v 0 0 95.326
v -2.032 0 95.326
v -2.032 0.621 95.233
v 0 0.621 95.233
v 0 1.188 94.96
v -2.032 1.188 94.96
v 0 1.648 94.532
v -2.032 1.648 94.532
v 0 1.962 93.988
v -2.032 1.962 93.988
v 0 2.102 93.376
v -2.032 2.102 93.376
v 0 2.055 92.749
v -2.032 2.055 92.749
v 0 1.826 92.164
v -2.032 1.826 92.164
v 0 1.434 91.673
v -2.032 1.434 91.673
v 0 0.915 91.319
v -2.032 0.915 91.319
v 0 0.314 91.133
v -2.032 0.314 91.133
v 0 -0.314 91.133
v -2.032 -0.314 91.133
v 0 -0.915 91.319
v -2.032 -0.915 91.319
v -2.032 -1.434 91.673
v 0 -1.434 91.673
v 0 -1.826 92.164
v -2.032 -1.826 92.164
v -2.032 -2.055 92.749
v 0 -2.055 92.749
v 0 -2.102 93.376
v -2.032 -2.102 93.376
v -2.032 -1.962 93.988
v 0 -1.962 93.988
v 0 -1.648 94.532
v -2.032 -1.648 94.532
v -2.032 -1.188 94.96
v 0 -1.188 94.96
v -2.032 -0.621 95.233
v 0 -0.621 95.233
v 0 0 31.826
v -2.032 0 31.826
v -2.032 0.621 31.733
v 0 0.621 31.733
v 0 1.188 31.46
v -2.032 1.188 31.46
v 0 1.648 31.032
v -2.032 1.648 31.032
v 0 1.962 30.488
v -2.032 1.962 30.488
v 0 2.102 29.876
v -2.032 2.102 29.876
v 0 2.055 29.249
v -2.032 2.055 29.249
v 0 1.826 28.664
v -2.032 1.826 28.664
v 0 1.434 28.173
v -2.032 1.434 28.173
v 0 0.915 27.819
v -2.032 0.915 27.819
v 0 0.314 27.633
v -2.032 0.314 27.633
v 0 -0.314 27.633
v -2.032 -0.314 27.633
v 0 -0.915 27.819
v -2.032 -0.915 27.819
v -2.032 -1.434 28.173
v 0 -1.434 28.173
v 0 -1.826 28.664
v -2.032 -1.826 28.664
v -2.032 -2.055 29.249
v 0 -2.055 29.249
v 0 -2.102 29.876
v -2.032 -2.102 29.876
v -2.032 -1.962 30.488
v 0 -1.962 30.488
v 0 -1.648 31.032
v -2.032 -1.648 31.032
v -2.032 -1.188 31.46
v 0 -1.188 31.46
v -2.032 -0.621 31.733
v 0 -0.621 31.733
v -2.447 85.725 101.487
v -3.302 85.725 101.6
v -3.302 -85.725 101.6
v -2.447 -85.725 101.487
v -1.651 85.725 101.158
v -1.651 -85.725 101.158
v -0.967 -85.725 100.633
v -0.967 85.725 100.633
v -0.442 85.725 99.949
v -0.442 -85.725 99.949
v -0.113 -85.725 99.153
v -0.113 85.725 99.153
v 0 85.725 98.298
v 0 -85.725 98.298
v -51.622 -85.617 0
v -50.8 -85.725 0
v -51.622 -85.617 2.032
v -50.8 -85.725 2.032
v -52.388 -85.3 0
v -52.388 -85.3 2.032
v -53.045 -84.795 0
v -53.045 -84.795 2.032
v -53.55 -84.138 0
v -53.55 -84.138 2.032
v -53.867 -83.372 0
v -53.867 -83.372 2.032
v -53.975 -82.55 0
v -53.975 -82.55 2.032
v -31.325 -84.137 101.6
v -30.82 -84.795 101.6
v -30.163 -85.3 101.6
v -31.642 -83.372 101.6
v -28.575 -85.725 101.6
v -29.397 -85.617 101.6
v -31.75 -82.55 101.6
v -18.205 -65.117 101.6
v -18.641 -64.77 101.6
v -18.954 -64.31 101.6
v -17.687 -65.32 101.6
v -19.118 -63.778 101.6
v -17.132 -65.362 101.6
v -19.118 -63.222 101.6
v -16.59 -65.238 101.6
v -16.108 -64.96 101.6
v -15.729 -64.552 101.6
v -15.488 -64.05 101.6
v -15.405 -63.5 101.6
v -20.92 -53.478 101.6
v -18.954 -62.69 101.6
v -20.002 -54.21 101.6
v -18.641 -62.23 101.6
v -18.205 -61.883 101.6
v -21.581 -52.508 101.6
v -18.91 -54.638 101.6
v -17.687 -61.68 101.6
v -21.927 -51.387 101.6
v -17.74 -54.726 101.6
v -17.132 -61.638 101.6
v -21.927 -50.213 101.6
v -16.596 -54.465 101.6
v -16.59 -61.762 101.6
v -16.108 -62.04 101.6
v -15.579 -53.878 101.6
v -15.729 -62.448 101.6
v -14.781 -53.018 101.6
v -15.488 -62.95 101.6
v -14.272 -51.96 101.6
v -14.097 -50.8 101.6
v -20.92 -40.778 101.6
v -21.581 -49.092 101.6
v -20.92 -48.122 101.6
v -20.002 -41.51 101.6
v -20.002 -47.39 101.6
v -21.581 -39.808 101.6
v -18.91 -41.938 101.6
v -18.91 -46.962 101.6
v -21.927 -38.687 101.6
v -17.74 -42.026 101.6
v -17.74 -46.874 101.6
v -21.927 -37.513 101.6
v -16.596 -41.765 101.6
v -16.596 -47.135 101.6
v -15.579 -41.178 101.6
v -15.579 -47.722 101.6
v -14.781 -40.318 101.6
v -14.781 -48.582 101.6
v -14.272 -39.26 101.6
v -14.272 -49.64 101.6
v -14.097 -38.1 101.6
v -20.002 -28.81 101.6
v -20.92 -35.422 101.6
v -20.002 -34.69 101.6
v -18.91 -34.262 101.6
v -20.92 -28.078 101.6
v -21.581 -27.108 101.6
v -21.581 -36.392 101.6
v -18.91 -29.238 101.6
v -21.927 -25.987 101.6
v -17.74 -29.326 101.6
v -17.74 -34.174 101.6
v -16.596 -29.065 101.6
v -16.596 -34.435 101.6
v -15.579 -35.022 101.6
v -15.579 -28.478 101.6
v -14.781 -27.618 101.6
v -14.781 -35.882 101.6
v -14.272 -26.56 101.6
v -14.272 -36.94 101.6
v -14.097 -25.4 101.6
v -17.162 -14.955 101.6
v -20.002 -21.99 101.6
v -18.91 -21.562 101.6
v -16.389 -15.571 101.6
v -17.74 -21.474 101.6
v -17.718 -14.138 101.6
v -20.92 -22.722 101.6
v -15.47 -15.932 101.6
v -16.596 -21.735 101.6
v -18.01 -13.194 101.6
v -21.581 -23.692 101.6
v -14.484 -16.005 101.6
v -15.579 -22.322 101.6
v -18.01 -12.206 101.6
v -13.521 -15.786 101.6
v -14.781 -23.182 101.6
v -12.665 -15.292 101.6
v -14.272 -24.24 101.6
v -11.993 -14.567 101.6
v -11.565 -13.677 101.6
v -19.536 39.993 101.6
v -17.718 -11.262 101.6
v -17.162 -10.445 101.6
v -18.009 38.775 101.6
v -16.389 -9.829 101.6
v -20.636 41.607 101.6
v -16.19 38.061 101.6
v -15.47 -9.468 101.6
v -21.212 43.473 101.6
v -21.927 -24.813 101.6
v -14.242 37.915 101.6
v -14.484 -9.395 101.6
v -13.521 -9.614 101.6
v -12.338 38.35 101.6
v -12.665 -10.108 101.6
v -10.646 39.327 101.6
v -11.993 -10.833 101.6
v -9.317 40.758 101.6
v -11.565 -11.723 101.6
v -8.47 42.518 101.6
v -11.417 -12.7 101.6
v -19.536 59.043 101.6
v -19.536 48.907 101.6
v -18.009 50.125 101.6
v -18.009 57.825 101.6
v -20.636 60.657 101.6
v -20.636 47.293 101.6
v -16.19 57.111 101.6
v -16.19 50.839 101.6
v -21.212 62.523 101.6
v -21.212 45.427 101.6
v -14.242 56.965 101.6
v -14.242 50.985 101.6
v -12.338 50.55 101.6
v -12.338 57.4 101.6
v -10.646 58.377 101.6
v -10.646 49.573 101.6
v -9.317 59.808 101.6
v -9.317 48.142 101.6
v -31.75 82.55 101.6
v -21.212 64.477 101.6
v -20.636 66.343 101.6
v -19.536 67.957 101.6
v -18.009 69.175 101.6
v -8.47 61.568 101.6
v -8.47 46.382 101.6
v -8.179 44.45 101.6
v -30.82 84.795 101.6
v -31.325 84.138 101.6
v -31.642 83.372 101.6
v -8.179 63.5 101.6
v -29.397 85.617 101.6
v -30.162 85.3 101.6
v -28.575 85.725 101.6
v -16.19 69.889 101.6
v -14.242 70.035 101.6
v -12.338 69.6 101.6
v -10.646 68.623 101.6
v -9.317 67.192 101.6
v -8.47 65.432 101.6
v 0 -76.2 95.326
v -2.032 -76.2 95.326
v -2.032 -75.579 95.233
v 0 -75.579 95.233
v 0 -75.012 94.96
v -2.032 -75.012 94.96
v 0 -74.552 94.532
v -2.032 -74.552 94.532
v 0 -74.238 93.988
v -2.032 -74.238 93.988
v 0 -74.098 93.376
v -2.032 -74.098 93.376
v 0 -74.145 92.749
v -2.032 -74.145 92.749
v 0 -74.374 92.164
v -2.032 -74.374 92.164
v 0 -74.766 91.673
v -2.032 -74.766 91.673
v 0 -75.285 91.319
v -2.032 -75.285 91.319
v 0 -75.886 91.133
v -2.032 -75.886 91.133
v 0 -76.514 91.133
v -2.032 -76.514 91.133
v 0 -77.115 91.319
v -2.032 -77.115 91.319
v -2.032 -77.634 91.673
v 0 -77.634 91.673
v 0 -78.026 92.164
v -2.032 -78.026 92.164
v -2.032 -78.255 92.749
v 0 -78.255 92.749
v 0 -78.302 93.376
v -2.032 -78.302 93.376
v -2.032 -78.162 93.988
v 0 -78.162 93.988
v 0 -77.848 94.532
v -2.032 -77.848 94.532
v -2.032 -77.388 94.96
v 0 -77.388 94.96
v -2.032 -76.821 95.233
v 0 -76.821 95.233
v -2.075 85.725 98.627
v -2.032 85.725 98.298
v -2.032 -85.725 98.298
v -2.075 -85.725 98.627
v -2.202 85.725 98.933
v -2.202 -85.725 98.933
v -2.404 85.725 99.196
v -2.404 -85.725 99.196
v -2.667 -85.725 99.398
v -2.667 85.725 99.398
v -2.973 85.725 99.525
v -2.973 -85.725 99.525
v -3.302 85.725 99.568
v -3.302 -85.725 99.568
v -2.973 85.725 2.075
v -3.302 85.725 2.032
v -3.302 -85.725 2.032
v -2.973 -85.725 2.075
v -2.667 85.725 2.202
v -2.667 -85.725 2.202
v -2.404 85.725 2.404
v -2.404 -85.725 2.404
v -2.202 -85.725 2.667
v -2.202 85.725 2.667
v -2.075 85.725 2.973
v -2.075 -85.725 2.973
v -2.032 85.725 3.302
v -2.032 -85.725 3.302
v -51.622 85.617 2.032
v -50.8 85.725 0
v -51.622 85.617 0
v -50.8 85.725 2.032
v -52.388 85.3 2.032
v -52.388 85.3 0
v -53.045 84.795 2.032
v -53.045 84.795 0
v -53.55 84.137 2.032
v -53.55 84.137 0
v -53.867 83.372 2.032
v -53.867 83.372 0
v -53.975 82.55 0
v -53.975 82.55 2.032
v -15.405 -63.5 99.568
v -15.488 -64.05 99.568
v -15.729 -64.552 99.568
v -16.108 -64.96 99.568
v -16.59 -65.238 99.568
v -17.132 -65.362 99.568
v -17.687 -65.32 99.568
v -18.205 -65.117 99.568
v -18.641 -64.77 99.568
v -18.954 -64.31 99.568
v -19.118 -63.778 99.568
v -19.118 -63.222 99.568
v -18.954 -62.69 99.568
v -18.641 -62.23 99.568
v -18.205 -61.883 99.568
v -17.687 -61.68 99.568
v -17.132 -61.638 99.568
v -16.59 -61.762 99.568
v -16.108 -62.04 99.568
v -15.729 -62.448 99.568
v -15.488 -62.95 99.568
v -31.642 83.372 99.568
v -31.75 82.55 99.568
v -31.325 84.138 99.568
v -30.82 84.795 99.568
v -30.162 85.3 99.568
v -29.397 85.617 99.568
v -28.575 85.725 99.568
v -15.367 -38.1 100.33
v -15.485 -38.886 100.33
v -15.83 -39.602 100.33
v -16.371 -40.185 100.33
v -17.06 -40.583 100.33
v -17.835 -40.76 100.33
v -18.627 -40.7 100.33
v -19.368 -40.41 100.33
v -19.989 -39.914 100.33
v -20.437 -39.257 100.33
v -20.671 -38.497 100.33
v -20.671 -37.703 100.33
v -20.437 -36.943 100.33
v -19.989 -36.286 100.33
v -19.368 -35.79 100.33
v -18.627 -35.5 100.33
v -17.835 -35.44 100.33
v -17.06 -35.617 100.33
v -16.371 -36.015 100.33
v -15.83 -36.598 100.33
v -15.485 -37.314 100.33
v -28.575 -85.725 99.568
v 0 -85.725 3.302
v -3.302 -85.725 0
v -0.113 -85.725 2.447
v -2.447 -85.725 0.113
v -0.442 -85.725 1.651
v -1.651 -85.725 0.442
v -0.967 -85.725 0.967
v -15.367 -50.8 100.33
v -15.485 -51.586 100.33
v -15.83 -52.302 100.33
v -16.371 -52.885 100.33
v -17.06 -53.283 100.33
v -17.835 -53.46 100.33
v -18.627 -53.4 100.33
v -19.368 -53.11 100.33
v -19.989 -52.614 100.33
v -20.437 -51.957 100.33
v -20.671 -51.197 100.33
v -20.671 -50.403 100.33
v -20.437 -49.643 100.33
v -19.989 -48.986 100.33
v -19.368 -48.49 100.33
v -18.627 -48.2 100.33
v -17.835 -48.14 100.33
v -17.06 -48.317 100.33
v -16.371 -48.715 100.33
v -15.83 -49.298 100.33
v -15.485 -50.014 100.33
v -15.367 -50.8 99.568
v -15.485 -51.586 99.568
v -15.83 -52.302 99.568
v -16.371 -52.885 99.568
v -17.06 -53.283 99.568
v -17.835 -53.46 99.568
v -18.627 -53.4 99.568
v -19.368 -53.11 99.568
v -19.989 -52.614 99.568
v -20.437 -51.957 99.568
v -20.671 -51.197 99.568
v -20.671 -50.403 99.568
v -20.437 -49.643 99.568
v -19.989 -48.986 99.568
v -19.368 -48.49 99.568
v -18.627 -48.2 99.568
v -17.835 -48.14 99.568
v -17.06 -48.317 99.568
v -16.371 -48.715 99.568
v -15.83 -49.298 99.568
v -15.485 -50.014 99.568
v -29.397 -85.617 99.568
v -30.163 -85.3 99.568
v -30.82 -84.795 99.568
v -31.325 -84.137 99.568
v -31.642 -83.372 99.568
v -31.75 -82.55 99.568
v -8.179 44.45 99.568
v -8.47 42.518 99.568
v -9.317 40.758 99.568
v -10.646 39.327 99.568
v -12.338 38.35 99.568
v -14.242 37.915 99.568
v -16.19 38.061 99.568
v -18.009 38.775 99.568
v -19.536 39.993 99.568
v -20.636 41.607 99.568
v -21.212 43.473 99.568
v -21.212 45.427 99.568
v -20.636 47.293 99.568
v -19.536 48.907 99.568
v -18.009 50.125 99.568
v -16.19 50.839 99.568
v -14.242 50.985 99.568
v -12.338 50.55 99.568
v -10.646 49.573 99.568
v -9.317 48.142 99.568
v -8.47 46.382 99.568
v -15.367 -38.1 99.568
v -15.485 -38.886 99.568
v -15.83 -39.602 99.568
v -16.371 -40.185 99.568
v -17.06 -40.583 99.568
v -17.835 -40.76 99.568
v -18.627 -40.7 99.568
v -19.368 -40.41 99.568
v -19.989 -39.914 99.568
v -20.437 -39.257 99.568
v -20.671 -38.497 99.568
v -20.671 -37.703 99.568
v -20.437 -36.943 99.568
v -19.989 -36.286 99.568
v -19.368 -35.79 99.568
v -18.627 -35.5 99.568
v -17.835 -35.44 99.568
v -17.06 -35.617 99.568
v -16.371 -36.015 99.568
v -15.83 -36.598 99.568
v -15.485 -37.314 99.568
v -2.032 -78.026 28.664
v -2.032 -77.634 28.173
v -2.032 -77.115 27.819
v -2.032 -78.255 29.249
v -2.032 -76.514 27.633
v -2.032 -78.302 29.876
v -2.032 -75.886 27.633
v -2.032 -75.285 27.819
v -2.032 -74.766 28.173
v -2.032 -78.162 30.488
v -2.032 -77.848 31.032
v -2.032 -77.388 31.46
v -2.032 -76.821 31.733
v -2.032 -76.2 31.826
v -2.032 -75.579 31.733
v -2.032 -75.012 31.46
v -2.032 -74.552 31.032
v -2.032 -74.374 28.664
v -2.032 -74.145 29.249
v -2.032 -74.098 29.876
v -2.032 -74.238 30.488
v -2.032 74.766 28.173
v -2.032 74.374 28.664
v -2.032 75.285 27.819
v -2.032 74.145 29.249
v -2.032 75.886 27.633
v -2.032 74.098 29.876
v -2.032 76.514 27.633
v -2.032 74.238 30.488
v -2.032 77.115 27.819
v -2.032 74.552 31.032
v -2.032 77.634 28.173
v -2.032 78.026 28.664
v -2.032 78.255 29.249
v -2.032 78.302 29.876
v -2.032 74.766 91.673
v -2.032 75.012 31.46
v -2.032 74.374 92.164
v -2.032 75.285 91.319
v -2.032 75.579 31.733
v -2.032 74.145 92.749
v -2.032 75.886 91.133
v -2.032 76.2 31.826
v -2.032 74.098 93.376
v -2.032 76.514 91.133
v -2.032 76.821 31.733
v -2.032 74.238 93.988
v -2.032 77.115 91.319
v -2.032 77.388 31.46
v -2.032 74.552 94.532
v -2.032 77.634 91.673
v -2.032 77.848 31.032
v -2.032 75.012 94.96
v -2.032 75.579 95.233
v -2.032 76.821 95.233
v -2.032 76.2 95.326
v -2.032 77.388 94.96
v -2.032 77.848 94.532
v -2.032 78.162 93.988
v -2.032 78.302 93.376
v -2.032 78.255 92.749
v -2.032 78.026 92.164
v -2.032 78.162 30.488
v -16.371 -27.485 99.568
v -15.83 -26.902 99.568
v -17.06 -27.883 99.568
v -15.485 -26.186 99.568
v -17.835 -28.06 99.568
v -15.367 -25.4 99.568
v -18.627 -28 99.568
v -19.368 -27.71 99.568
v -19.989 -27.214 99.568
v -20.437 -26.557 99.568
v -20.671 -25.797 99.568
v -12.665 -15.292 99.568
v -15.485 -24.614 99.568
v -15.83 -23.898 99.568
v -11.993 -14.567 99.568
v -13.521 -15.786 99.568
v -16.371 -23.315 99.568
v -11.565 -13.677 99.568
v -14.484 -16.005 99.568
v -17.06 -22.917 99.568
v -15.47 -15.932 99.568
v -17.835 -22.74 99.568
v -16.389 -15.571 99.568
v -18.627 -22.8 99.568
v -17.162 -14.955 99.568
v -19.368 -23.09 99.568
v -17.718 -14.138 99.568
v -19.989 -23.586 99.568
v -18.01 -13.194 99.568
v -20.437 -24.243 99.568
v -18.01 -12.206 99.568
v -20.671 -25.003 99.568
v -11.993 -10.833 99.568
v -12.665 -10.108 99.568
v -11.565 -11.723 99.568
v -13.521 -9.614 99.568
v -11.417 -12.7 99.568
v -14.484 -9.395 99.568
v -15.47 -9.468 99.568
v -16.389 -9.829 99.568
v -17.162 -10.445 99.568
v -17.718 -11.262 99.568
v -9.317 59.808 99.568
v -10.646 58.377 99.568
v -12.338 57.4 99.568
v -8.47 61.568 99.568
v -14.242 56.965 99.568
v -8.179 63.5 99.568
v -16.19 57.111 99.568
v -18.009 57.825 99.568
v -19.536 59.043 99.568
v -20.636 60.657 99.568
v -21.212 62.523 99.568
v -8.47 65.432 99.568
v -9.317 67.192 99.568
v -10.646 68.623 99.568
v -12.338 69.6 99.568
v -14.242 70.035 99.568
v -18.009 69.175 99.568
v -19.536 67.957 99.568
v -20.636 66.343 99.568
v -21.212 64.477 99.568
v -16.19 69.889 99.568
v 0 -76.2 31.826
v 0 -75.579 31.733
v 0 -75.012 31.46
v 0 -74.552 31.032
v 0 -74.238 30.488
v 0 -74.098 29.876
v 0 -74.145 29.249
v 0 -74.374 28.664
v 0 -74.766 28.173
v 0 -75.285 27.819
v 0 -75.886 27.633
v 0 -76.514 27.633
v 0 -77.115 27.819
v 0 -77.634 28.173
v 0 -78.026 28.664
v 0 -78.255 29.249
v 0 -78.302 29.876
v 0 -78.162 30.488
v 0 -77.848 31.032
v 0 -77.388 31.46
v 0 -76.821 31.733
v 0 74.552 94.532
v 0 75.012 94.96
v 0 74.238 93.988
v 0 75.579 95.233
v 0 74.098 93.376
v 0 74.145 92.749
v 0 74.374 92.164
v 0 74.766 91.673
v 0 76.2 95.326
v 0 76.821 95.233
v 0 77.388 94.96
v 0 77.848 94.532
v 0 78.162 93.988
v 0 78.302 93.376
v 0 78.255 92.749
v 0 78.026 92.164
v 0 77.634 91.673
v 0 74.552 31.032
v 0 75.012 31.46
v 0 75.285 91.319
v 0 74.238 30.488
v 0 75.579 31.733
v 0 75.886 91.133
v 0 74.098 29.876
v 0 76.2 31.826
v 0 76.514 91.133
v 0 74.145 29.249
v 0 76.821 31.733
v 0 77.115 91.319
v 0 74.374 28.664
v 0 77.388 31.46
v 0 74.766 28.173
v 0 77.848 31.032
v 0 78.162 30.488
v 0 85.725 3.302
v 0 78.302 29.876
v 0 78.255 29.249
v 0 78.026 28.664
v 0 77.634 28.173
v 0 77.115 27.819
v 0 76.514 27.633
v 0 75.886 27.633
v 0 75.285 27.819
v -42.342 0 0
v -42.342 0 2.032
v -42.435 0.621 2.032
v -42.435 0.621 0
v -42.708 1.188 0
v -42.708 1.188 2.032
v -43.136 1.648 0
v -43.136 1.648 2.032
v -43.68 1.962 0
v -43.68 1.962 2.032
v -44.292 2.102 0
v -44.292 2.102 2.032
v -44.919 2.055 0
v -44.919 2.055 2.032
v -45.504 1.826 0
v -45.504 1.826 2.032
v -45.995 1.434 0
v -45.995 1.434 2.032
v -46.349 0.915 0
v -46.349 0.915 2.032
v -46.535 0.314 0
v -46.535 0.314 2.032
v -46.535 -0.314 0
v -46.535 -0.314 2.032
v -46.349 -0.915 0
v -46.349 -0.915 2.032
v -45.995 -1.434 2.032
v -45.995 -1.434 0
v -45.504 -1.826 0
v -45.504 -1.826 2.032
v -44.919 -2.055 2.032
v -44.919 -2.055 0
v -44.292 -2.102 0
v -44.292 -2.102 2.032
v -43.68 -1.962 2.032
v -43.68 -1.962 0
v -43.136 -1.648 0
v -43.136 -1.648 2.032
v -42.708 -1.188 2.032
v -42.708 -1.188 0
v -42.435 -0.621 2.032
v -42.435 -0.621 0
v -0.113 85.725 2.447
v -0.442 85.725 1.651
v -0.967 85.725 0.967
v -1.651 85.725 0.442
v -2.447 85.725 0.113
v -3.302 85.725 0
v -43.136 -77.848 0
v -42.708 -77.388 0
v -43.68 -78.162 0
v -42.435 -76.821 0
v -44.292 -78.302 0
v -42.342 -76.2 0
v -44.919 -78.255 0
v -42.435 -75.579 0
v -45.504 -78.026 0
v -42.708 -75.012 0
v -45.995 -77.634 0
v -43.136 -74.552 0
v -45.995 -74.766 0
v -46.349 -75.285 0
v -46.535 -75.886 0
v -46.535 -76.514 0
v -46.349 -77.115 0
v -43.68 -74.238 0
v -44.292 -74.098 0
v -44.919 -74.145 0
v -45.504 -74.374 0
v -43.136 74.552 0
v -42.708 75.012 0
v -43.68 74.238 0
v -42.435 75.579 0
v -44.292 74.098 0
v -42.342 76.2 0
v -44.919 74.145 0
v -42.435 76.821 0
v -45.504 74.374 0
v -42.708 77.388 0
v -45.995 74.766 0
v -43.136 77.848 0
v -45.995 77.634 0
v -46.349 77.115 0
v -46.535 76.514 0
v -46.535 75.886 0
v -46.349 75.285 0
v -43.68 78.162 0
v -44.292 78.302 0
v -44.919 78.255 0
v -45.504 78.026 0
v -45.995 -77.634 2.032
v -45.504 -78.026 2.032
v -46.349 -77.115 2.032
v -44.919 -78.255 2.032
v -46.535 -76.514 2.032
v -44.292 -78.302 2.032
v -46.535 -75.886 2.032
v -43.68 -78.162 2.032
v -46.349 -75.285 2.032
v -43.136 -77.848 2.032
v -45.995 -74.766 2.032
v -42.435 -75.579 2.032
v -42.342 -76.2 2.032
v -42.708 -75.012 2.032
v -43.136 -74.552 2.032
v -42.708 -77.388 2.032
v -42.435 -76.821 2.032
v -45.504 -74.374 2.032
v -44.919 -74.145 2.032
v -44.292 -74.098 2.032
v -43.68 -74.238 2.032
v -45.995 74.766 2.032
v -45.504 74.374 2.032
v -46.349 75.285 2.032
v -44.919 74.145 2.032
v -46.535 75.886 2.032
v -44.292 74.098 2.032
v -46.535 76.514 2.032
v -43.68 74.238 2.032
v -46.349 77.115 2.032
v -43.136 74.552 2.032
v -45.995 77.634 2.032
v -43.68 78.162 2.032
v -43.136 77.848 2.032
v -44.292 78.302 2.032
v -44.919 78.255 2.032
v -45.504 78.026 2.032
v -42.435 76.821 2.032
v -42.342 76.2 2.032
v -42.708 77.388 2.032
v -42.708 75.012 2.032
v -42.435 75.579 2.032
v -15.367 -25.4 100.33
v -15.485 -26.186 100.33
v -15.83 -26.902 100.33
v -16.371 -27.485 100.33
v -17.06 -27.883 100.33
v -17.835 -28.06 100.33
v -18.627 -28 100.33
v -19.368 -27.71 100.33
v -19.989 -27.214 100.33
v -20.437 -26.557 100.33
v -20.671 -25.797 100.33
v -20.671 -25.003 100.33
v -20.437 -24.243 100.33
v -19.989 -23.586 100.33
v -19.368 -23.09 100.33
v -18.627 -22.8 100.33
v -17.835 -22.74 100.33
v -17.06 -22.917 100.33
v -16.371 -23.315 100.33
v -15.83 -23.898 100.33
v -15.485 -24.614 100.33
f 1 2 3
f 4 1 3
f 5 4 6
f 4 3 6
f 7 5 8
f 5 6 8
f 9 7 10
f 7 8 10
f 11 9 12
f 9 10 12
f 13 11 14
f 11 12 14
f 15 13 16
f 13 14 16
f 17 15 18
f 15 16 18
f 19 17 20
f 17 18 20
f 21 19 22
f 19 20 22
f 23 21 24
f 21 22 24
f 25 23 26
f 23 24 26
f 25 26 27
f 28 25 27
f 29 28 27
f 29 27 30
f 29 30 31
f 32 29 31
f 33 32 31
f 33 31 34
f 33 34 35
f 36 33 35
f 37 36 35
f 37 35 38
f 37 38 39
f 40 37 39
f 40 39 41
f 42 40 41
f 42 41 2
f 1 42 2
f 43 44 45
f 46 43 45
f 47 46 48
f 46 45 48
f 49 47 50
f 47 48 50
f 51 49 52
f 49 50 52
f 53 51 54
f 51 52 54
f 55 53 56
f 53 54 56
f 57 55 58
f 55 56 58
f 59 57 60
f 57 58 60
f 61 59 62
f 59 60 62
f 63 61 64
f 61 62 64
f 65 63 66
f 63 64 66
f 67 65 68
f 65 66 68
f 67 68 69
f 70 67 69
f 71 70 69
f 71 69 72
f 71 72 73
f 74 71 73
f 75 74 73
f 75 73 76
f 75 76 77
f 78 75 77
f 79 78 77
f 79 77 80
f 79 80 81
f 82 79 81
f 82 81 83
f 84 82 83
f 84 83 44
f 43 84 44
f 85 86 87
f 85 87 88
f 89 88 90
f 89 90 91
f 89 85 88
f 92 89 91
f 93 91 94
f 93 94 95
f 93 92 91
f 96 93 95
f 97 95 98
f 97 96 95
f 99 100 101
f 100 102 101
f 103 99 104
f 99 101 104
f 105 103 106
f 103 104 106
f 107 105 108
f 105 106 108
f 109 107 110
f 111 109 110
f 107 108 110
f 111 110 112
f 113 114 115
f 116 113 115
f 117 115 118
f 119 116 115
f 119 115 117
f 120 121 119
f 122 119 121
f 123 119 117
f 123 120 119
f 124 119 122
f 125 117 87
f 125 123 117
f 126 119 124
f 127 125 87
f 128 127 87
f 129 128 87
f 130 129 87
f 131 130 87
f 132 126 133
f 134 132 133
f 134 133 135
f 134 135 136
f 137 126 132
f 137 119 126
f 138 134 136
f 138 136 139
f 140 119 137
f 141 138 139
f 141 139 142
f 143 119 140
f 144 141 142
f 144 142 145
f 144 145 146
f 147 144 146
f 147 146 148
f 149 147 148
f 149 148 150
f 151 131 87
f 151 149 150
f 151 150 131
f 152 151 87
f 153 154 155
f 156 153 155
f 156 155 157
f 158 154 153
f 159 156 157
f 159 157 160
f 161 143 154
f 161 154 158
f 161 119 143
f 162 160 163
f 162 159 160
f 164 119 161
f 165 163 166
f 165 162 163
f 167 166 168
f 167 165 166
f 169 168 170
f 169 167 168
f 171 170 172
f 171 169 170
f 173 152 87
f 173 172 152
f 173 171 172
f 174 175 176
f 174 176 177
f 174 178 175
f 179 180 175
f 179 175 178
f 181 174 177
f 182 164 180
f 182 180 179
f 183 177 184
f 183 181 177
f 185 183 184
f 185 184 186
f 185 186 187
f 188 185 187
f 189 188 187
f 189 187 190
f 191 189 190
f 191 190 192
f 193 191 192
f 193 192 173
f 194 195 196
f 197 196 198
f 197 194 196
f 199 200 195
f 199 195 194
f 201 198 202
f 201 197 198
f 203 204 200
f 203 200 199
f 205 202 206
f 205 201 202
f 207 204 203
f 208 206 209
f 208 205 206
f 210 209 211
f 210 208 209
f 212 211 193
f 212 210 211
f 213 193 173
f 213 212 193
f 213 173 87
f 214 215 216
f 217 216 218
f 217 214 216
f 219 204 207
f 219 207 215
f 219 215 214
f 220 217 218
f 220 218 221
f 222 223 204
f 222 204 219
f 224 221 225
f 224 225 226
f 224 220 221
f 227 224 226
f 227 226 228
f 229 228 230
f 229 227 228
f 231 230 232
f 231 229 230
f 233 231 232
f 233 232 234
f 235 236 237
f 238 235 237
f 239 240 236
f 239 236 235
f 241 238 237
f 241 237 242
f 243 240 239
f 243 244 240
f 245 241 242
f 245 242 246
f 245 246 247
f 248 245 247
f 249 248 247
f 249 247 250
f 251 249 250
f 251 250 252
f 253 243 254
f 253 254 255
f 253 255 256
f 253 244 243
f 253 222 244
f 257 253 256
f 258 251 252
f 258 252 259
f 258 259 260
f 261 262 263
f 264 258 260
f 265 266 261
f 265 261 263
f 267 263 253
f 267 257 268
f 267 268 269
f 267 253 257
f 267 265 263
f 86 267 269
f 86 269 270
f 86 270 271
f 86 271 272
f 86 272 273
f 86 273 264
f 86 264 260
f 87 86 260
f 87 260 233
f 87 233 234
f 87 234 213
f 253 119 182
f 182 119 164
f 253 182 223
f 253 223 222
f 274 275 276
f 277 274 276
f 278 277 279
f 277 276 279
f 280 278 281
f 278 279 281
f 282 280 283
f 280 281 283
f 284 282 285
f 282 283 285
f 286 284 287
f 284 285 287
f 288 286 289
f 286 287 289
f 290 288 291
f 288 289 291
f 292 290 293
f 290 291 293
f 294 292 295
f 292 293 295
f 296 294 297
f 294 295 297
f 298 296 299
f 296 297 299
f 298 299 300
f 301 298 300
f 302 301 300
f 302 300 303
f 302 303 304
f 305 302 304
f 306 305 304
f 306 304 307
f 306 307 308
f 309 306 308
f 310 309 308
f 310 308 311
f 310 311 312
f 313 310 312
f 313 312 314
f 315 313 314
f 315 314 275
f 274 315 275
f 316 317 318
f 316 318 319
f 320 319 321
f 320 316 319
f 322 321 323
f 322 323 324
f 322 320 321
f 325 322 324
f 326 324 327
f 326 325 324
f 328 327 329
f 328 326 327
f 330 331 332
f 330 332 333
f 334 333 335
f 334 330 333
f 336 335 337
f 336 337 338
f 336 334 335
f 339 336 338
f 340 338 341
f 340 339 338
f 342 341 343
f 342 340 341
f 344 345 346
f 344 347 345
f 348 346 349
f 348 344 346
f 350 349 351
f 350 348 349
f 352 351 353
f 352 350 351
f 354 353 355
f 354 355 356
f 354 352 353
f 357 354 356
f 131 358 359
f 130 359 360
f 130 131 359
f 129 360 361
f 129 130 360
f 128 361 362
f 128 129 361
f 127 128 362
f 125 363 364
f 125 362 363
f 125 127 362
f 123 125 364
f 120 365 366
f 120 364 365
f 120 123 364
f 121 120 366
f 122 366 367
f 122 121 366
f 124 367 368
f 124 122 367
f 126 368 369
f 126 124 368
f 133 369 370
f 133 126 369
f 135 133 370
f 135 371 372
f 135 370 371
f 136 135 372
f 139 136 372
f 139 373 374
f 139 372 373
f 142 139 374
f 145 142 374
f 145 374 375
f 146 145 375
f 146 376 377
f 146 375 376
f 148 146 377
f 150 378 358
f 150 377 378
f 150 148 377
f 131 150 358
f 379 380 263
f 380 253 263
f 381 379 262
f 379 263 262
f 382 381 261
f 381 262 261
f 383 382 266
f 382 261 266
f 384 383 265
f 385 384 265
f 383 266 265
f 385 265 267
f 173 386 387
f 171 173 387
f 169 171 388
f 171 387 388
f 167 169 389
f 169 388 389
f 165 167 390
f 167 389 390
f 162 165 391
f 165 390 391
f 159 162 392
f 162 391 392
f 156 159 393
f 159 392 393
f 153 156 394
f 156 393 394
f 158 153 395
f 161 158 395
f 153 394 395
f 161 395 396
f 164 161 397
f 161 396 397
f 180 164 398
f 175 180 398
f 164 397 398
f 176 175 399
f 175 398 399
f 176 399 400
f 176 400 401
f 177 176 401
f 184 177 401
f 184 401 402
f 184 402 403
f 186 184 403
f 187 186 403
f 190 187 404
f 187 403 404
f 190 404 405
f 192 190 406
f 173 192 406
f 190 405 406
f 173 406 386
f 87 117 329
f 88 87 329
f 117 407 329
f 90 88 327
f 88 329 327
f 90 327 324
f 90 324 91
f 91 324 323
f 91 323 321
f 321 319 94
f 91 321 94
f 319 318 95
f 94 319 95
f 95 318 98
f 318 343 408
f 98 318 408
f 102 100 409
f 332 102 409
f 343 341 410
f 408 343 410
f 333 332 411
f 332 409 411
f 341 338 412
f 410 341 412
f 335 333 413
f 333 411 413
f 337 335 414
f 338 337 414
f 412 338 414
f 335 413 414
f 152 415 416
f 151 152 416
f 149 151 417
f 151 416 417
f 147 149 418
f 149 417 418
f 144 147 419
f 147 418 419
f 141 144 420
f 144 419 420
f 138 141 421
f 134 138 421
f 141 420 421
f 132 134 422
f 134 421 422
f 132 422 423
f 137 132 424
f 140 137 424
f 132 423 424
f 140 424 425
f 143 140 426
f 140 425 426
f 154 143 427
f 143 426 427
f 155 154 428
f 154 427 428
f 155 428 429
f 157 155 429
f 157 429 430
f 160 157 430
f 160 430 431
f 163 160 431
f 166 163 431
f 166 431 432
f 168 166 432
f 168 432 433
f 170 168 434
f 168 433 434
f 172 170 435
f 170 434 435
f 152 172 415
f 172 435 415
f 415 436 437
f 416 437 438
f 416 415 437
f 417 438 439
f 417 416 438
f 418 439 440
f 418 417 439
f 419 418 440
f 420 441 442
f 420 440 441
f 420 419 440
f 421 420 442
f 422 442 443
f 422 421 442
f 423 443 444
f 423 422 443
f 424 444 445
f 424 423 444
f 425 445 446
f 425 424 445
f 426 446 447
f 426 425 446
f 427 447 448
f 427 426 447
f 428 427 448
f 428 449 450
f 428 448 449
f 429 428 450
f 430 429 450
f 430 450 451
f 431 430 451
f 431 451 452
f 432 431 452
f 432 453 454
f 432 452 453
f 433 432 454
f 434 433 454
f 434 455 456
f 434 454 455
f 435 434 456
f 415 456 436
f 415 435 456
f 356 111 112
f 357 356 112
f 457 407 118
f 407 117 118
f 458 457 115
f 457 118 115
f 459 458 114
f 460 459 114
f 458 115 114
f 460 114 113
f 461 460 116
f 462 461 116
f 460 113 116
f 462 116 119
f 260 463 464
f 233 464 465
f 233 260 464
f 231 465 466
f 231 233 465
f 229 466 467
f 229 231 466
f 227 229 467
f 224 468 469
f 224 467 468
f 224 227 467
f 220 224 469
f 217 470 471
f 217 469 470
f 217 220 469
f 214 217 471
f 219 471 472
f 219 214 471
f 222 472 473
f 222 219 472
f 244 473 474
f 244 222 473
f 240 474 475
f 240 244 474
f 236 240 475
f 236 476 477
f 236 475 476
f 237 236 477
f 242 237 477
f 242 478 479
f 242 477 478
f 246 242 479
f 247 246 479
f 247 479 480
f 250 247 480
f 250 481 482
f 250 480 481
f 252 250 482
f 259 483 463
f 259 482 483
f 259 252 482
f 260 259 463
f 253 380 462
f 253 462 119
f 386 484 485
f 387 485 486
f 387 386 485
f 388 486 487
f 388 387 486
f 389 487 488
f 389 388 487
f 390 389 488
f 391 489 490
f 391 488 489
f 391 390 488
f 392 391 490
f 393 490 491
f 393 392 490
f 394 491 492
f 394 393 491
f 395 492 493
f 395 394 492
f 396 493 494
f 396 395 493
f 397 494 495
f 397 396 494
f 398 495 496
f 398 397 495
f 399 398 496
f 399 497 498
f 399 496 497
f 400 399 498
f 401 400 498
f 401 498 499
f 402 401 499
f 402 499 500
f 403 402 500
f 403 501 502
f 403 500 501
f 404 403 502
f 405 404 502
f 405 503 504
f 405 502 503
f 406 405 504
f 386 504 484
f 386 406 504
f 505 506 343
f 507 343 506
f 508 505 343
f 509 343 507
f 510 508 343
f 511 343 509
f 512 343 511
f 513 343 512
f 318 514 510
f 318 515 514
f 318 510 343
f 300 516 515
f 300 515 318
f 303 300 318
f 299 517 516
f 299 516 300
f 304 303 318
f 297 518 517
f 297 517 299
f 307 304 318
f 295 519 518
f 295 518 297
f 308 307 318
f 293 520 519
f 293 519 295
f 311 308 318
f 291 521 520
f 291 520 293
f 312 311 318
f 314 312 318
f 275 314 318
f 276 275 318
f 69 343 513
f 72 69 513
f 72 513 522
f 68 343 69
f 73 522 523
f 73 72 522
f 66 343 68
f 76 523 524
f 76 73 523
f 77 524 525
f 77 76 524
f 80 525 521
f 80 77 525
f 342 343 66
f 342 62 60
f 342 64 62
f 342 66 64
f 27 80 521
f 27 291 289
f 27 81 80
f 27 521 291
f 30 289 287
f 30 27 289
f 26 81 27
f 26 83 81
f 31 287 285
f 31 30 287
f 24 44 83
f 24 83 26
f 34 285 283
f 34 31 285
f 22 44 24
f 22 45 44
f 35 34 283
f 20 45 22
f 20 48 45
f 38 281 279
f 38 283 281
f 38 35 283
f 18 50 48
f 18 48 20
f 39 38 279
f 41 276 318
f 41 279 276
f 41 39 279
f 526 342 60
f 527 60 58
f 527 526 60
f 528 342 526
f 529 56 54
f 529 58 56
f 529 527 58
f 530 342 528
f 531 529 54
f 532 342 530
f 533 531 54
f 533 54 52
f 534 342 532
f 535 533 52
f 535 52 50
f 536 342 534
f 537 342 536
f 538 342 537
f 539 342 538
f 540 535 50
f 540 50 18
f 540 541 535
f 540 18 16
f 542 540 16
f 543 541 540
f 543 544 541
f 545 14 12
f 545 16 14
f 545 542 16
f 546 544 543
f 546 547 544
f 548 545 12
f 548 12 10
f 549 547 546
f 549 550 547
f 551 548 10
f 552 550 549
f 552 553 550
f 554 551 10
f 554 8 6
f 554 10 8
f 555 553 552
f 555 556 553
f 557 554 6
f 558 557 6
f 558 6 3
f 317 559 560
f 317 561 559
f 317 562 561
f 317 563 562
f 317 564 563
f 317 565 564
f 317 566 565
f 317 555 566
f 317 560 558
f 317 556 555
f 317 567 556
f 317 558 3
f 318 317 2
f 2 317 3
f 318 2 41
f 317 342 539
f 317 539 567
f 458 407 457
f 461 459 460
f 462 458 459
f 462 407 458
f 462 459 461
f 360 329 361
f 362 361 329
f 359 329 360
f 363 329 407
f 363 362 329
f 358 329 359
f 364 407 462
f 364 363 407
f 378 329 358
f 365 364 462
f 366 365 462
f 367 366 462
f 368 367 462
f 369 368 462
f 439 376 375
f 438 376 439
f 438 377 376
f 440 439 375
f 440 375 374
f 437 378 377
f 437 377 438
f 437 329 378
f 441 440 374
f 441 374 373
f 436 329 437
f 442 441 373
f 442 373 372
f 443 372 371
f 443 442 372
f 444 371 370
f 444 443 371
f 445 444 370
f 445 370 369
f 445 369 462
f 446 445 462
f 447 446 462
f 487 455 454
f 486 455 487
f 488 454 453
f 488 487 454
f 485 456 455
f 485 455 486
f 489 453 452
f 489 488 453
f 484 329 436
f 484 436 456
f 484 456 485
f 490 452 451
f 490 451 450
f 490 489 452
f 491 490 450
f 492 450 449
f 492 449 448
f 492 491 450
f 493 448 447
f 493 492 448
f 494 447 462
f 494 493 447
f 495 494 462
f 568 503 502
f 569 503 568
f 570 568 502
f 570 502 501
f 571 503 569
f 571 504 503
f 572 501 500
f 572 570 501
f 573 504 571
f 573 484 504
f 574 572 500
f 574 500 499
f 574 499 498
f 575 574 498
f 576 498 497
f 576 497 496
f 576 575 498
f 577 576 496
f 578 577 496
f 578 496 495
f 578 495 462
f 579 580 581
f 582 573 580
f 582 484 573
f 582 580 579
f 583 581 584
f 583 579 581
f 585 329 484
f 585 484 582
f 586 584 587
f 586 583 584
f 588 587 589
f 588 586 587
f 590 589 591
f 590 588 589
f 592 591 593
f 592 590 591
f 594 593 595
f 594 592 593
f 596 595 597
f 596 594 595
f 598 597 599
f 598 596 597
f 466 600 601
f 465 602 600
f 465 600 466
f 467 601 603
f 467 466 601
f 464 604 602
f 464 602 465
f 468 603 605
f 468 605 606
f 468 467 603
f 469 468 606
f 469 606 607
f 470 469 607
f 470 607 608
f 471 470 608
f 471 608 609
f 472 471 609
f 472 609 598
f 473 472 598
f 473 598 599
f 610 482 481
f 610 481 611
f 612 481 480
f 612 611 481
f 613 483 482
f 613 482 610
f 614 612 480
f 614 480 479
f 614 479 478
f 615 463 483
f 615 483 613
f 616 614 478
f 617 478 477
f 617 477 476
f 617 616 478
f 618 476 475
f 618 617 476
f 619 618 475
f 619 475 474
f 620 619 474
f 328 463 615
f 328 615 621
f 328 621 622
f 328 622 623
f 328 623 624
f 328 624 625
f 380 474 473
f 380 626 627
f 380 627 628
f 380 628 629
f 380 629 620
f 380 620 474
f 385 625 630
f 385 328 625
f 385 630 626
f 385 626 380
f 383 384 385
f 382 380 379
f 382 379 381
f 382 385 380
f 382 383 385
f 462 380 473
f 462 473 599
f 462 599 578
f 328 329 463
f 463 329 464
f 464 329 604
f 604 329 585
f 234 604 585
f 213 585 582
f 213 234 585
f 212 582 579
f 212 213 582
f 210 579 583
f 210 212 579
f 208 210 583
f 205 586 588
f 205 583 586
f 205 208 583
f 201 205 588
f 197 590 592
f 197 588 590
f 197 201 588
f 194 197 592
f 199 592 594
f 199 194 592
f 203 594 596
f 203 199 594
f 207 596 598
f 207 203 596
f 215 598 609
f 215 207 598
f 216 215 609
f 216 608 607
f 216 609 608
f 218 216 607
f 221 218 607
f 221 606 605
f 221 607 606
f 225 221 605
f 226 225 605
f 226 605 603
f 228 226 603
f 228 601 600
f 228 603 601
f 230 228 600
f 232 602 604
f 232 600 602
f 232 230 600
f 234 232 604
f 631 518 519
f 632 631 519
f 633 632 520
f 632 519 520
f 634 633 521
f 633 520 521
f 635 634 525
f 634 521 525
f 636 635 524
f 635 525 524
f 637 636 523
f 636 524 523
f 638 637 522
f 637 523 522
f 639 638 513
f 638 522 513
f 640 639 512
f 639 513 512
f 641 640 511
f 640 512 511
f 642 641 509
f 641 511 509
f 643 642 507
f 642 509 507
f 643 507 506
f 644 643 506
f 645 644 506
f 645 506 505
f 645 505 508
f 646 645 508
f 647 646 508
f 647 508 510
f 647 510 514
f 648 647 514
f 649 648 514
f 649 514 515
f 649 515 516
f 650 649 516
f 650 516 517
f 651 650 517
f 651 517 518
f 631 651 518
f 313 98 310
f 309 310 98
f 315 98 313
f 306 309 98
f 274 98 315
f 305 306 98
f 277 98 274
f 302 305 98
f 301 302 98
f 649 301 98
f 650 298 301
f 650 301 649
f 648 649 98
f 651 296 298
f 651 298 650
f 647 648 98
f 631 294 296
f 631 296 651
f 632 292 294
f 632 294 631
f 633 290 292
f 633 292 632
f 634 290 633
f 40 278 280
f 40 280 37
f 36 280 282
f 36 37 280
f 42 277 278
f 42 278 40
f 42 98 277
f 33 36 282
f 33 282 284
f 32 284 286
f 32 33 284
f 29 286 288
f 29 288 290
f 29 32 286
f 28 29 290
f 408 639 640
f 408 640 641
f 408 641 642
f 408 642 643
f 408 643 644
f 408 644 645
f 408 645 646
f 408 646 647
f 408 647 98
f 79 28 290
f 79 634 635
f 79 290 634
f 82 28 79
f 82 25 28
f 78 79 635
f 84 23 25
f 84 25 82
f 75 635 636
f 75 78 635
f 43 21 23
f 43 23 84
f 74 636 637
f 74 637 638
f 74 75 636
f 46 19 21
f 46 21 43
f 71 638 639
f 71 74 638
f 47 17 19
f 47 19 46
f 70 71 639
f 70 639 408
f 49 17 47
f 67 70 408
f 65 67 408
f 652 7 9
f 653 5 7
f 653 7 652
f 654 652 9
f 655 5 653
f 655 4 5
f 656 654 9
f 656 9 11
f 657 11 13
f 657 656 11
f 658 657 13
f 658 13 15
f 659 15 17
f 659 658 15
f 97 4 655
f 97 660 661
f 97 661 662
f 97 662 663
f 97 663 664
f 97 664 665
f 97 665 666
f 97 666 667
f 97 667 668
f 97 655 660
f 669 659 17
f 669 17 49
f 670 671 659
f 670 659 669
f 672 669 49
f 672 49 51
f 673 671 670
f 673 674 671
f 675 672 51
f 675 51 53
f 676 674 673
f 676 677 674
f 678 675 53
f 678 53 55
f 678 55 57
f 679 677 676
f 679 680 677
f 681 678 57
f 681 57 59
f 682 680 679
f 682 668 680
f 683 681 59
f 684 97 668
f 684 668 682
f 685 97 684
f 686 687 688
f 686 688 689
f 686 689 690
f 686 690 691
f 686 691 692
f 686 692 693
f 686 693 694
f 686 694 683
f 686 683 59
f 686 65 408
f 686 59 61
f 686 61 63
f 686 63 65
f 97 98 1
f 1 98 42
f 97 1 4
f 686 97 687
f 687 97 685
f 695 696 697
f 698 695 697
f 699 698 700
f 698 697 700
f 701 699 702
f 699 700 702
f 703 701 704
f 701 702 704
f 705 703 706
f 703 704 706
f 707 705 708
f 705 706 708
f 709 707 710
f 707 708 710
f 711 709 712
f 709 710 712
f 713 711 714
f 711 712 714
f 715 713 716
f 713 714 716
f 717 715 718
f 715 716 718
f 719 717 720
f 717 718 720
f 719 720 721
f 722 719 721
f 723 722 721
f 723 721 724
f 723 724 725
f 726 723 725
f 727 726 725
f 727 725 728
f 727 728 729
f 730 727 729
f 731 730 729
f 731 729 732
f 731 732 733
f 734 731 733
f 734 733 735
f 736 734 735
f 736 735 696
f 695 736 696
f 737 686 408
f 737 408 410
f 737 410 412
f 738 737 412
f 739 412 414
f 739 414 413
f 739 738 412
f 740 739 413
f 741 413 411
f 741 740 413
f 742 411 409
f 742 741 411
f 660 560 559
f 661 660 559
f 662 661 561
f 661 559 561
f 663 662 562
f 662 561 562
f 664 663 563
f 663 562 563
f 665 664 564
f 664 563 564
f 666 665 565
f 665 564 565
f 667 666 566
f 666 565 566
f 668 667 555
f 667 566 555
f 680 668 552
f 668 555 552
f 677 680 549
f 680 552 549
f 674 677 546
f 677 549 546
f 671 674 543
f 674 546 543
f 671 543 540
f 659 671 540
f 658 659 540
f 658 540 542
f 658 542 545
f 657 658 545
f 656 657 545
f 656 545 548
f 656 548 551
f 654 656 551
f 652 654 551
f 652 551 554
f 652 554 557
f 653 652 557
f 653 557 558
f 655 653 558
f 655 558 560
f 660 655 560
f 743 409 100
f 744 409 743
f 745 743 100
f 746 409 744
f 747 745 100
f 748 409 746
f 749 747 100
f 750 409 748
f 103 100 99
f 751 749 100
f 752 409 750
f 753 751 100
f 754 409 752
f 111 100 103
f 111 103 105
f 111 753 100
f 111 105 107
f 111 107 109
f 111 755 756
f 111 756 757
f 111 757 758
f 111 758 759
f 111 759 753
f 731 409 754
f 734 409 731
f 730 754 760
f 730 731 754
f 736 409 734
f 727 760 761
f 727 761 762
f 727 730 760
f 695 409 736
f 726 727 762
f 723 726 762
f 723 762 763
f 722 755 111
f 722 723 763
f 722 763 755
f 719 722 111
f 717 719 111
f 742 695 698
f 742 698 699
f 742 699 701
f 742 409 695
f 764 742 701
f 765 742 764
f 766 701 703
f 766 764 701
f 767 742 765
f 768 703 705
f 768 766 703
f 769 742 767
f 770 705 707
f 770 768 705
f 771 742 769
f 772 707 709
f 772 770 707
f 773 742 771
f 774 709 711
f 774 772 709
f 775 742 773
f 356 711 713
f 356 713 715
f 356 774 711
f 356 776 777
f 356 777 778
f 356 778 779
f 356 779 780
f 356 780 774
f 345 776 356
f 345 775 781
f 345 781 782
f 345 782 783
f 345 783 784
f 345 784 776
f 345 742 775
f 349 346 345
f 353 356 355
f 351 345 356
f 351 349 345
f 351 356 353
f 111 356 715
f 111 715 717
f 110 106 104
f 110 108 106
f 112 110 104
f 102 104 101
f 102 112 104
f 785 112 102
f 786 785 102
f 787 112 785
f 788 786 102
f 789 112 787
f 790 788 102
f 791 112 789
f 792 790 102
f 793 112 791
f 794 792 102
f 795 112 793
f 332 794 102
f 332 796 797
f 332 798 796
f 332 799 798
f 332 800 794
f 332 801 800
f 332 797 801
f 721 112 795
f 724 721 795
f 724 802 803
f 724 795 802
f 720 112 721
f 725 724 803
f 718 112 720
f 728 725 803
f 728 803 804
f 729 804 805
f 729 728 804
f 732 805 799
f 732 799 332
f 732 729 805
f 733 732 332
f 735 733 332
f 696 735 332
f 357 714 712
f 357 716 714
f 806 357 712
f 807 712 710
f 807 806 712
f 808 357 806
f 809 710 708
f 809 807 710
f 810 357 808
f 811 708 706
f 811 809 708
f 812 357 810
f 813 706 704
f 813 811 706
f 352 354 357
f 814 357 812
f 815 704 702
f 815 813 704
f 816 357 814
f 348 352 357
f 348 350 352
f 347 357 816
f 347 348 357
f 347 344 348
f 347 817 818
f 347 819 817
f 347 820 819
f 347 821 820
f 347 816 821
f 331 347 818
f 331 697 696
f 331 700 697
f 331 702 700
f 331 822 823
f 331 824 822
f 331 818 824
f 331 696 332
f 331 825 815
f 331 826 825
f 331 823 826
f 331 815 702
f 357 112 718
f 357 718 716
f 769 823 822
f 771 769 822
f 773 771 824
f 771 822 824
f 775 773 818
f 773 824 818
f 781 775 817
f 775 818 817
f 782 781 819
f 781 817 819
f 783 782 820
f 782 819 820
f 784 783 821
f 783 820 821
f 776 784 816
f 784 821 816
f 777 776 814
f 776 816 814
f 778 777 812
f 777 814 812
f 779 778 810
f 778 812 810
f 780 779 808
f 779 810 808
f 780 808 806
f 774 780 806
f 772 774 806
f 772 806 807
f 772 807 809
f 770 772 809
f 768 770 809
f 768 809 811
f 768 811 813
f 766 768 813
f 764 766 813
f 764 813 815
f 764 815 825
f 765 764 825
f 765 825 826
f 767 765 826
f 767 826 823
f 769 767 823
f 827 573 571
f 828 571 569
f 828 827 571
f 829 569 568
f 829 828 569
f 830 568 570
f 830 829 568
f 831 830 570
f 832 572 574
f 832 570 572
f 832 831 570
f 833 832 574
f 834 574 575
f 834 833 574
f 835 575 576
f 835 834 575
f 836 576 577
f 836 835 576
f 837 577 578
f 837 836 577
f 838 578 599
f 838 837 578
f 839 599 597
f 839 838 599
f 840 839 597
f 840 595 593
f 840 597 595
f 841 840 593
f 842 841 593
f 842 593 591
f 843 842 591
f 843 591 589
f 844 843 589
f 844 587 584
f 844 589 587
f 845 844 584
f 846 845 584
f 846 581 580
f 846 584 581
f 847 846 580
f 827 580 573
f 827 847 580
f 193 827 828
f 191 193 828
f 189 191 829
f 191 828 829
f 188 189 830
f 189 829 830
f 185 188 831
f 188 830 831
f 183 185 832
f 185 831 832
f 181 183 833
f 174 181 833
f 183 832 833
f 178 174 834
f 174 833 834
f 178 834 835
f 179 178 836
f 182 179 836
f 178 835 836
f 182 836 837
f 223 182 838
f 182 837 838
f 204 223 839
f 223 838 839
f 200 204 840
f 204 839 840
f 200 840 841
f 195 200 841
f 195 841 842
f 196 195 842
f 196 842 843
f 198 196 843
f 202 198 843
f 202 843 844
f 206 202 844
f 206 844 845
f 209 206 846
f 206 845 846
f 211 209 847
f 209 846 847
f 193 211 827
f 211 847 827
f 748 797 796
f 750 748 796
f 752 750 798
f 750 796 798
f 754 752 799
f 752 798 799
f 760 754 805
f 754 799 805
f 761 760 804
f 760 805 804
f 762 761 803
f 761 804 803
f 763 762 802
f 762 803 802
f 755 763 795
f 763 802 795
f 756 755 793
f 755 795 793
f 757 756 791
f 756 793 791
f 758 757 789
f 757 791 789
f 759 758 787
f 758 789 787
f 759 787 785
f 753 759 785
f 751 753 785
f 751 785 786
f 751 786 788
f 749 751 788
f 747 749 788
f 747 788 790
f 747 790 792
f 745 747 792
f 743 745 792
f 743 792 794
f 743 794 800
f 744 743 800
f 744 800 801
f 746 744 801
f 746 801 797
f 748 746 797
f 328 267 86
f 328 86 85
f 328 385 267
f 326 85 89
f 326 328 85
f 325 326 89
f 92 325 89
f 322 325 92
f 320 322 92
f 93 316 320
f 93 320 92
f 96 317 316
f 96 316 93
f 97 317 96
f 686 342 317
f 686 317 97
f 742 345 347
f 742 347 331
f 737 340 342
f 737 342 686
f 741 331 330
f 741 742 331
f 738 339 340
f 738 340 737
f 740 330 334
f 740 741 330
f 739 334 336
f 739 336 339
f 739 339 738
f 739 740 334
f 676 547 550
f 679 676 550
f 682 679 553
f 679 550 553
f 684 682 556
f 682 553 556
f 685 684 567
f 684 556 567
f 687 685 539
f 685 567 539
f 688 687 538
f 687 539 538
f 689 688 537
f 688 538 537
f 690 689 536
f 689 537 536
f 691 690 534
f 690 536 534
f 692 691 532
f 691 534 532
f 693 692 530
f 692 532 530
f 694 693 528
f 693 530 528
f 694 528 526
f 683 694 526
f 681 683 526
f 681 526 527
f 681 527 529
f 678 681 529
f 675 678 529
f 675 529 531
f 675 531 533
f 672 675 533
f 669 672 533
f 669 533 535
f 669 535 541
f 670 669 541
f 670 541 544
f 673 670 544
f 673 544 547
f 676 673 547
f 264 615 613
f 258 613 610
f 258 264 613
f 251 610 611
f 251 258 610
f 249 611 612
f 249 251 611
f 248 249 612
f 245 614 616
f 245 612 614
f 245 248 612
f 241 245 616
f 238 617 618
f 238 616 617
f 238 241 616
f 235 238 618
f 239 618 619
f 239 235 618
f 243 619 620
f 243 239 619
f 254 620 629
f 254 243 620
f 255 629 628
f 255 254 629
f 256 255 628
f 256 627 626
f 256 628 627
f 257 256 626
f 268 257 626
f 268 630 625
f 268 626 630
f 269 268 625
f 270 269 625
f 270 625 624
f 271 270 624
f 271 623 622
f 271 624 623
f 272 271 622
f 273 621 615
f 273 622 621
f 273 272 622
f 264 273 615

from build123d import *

# Parameters (mm, degrees)
BASE_FLANGE1_DEPTH                 = 85.725
SKETCH2_R                          = 6.5532
SKETCH2_R_2                        = 3.3147
SKETCH2_R_3                        = 2.667
SKETCH2_R_4                        = 1.8669
FCE_1_INDICATOR_HOLES_DEPTH        = 2.54
SKETCH3_R                          = 2.1082
FCE_2_BRACKET_MOUNTING_HOLES_DEPTH = 2.54
CHAMFER1_SIZE                      = 1.27
SKETCH8_R                          = 2.1082
FCE_3_BOARD_MOUNTING_HOLES_DEPTH   = 2.54
FILLET1_R                          = 3.175


# Sheet-metal steps are written as plain solids
with BuildPart() as part:
    # Sketch1 → Base-Flange1 (new, symmetric)
    with BuildSketch(Plane(origin=(0, 0, 0), x_dir=(1, 0, 0), z_dir=(0, 1, 0))):
        with BuildLine():
            Line((-31.75, -101.6), (-3.302, -101.6))
            ThreePointArc((-3.302, -101.6), (-0.967133409, -100.632866591), (0, -98.298))
            Line((0, -98.298), (0, -3.302))
            ThreePointArc((0, -3.302), (-0.967133409, -0.967133409), (-3.302, 0))
            Line((-3.302, 0), (-53.975, 0))
            Line((-53.975, 0), (-53.975, -2.032))
            Line((-53.975, -2.032), (-3.302, -2.032))
            ThreePointArc((-3.302, -2.032), (-2.403974388, -2.403974388), (-2.032, -3.302))
            Line((-2.032, -3.302), (-2.032, -98.298))
            ThreePointArc((-2.032, -98.298), (-2.403974388, -99.196025612), (-3.302, -99.568))
            Line((-3.302, -99.568), (-31.75, -99.568))
            Line((-31.75, -99.568), (-31.75, -101.6))
        make_face()
    extrude(amount=BASE_FLANGE1_DEPTH, both=True)

    # Sketch2 → FCE-1 Indicator holes (cut)
    with BuildSketch(Plane(origin=(0, 0, 101.6), x_dir=(-1, 0, 0), z_dir=(0, 0, -1))):
        with Locations(Location((14.732, 63.5, 0), (0, 0, 180))):
            Circle(SKETCH2_R)
        with Locations(Location((14.732, 44.45, 0), (0, 0, 180))):
            Circle(SKETCH2_R)
        with Locations(Location((14.732, -12.7, 0), (0, 0, 180))):
            Circle(SKETCH2_R_2)
        with Locations(Location((18.034, -25.4, 0), (0, 0, 180))):
            Circle(SKETCH2_R_3)
        with Locations(Location((18.034, -38.1, 0), (0, 0, 180))):
            Circle(SKETCH2_R_3)
        with Locations(Location((18.034, -50.8, 0), (0, 0, 180))):
            Circle(SKETCH2_R_3)
        with Locations(Location((17.272, -63.5, 0), (0, 0, 180))):
            Circle(SKETCH2_R_4)
    extrude(amount=FCE_1_INDICATOR_HOLES_DEPTH, mode=Mode.SUBTRACT)

    # Sketch3 → FCE-2 Bracket Mounting Holes (cut)
    with BuildSketch(Plane.XY.offset(2.032)):
        with Locations((-44.45, 76.2)):
            Circle(SKETCH3_R)
        with Locations((-44.45, 0)):
            Circle(SKETCH3_R)
        with Locations((-44.45, -76.2)):
            Circle(SKETCH3_R)
    extrude(amount=-FCE_2_BRACKET_MOUNTING_HOLES_DEPTH, mode=Mode.SUBTRACT)

    # Chamfer1
    chamfer1_edges = [part.edges().sort_by_distance(p)[0] for p in [
        (-20.701, -25.4, 101.6),
        (-20.701, -38.1, 101.6),
        (-20.701, -50.8, 101.6),
    ]]
    chamfer(chamfer1_edges, length=CHAMFER1_SIZE)

    # Sketch8 → FCE-3 Board Mounting Holes (cut)
    with BuildSketch(Plane.ZY.offset(2.032)):
        with Locations((93.218, 76.2)):
            Circle(SKETCH8_R)
        with Locations((93.218, 0)):
            Circle(SKETCH8_R)
        with Locations((93.218, -76.2)):
            Circle(SKETCH8_R)
        with Locations((29.718, -76.2)):
            Circle(SKETCH8_R)
        with Locations((29.718, 0)):
            Circle(SKETCH8_R)
        with Locations((29.718, 76.2)):
            Circle(SKETCH8_R)
    extrude(amount=-FCE_3_BOARD_MOUNTING_HOLES_DEPTH, mode=Mode.SUBTRACT)

    # Fillet1
    fillet1_edges = [part.edges().sort_by_distance(p)[0] for p in [
        (-31.75, -85.725, 100.584),
        (-53.975, 85.725, 1.016),
        (-31.75, 85.725, 100.584),
        (-53.975, -85.725, 1.016),
    ]]
    fillet(fillet1_edges, radius=FILLET1_R)


solid = part.part
